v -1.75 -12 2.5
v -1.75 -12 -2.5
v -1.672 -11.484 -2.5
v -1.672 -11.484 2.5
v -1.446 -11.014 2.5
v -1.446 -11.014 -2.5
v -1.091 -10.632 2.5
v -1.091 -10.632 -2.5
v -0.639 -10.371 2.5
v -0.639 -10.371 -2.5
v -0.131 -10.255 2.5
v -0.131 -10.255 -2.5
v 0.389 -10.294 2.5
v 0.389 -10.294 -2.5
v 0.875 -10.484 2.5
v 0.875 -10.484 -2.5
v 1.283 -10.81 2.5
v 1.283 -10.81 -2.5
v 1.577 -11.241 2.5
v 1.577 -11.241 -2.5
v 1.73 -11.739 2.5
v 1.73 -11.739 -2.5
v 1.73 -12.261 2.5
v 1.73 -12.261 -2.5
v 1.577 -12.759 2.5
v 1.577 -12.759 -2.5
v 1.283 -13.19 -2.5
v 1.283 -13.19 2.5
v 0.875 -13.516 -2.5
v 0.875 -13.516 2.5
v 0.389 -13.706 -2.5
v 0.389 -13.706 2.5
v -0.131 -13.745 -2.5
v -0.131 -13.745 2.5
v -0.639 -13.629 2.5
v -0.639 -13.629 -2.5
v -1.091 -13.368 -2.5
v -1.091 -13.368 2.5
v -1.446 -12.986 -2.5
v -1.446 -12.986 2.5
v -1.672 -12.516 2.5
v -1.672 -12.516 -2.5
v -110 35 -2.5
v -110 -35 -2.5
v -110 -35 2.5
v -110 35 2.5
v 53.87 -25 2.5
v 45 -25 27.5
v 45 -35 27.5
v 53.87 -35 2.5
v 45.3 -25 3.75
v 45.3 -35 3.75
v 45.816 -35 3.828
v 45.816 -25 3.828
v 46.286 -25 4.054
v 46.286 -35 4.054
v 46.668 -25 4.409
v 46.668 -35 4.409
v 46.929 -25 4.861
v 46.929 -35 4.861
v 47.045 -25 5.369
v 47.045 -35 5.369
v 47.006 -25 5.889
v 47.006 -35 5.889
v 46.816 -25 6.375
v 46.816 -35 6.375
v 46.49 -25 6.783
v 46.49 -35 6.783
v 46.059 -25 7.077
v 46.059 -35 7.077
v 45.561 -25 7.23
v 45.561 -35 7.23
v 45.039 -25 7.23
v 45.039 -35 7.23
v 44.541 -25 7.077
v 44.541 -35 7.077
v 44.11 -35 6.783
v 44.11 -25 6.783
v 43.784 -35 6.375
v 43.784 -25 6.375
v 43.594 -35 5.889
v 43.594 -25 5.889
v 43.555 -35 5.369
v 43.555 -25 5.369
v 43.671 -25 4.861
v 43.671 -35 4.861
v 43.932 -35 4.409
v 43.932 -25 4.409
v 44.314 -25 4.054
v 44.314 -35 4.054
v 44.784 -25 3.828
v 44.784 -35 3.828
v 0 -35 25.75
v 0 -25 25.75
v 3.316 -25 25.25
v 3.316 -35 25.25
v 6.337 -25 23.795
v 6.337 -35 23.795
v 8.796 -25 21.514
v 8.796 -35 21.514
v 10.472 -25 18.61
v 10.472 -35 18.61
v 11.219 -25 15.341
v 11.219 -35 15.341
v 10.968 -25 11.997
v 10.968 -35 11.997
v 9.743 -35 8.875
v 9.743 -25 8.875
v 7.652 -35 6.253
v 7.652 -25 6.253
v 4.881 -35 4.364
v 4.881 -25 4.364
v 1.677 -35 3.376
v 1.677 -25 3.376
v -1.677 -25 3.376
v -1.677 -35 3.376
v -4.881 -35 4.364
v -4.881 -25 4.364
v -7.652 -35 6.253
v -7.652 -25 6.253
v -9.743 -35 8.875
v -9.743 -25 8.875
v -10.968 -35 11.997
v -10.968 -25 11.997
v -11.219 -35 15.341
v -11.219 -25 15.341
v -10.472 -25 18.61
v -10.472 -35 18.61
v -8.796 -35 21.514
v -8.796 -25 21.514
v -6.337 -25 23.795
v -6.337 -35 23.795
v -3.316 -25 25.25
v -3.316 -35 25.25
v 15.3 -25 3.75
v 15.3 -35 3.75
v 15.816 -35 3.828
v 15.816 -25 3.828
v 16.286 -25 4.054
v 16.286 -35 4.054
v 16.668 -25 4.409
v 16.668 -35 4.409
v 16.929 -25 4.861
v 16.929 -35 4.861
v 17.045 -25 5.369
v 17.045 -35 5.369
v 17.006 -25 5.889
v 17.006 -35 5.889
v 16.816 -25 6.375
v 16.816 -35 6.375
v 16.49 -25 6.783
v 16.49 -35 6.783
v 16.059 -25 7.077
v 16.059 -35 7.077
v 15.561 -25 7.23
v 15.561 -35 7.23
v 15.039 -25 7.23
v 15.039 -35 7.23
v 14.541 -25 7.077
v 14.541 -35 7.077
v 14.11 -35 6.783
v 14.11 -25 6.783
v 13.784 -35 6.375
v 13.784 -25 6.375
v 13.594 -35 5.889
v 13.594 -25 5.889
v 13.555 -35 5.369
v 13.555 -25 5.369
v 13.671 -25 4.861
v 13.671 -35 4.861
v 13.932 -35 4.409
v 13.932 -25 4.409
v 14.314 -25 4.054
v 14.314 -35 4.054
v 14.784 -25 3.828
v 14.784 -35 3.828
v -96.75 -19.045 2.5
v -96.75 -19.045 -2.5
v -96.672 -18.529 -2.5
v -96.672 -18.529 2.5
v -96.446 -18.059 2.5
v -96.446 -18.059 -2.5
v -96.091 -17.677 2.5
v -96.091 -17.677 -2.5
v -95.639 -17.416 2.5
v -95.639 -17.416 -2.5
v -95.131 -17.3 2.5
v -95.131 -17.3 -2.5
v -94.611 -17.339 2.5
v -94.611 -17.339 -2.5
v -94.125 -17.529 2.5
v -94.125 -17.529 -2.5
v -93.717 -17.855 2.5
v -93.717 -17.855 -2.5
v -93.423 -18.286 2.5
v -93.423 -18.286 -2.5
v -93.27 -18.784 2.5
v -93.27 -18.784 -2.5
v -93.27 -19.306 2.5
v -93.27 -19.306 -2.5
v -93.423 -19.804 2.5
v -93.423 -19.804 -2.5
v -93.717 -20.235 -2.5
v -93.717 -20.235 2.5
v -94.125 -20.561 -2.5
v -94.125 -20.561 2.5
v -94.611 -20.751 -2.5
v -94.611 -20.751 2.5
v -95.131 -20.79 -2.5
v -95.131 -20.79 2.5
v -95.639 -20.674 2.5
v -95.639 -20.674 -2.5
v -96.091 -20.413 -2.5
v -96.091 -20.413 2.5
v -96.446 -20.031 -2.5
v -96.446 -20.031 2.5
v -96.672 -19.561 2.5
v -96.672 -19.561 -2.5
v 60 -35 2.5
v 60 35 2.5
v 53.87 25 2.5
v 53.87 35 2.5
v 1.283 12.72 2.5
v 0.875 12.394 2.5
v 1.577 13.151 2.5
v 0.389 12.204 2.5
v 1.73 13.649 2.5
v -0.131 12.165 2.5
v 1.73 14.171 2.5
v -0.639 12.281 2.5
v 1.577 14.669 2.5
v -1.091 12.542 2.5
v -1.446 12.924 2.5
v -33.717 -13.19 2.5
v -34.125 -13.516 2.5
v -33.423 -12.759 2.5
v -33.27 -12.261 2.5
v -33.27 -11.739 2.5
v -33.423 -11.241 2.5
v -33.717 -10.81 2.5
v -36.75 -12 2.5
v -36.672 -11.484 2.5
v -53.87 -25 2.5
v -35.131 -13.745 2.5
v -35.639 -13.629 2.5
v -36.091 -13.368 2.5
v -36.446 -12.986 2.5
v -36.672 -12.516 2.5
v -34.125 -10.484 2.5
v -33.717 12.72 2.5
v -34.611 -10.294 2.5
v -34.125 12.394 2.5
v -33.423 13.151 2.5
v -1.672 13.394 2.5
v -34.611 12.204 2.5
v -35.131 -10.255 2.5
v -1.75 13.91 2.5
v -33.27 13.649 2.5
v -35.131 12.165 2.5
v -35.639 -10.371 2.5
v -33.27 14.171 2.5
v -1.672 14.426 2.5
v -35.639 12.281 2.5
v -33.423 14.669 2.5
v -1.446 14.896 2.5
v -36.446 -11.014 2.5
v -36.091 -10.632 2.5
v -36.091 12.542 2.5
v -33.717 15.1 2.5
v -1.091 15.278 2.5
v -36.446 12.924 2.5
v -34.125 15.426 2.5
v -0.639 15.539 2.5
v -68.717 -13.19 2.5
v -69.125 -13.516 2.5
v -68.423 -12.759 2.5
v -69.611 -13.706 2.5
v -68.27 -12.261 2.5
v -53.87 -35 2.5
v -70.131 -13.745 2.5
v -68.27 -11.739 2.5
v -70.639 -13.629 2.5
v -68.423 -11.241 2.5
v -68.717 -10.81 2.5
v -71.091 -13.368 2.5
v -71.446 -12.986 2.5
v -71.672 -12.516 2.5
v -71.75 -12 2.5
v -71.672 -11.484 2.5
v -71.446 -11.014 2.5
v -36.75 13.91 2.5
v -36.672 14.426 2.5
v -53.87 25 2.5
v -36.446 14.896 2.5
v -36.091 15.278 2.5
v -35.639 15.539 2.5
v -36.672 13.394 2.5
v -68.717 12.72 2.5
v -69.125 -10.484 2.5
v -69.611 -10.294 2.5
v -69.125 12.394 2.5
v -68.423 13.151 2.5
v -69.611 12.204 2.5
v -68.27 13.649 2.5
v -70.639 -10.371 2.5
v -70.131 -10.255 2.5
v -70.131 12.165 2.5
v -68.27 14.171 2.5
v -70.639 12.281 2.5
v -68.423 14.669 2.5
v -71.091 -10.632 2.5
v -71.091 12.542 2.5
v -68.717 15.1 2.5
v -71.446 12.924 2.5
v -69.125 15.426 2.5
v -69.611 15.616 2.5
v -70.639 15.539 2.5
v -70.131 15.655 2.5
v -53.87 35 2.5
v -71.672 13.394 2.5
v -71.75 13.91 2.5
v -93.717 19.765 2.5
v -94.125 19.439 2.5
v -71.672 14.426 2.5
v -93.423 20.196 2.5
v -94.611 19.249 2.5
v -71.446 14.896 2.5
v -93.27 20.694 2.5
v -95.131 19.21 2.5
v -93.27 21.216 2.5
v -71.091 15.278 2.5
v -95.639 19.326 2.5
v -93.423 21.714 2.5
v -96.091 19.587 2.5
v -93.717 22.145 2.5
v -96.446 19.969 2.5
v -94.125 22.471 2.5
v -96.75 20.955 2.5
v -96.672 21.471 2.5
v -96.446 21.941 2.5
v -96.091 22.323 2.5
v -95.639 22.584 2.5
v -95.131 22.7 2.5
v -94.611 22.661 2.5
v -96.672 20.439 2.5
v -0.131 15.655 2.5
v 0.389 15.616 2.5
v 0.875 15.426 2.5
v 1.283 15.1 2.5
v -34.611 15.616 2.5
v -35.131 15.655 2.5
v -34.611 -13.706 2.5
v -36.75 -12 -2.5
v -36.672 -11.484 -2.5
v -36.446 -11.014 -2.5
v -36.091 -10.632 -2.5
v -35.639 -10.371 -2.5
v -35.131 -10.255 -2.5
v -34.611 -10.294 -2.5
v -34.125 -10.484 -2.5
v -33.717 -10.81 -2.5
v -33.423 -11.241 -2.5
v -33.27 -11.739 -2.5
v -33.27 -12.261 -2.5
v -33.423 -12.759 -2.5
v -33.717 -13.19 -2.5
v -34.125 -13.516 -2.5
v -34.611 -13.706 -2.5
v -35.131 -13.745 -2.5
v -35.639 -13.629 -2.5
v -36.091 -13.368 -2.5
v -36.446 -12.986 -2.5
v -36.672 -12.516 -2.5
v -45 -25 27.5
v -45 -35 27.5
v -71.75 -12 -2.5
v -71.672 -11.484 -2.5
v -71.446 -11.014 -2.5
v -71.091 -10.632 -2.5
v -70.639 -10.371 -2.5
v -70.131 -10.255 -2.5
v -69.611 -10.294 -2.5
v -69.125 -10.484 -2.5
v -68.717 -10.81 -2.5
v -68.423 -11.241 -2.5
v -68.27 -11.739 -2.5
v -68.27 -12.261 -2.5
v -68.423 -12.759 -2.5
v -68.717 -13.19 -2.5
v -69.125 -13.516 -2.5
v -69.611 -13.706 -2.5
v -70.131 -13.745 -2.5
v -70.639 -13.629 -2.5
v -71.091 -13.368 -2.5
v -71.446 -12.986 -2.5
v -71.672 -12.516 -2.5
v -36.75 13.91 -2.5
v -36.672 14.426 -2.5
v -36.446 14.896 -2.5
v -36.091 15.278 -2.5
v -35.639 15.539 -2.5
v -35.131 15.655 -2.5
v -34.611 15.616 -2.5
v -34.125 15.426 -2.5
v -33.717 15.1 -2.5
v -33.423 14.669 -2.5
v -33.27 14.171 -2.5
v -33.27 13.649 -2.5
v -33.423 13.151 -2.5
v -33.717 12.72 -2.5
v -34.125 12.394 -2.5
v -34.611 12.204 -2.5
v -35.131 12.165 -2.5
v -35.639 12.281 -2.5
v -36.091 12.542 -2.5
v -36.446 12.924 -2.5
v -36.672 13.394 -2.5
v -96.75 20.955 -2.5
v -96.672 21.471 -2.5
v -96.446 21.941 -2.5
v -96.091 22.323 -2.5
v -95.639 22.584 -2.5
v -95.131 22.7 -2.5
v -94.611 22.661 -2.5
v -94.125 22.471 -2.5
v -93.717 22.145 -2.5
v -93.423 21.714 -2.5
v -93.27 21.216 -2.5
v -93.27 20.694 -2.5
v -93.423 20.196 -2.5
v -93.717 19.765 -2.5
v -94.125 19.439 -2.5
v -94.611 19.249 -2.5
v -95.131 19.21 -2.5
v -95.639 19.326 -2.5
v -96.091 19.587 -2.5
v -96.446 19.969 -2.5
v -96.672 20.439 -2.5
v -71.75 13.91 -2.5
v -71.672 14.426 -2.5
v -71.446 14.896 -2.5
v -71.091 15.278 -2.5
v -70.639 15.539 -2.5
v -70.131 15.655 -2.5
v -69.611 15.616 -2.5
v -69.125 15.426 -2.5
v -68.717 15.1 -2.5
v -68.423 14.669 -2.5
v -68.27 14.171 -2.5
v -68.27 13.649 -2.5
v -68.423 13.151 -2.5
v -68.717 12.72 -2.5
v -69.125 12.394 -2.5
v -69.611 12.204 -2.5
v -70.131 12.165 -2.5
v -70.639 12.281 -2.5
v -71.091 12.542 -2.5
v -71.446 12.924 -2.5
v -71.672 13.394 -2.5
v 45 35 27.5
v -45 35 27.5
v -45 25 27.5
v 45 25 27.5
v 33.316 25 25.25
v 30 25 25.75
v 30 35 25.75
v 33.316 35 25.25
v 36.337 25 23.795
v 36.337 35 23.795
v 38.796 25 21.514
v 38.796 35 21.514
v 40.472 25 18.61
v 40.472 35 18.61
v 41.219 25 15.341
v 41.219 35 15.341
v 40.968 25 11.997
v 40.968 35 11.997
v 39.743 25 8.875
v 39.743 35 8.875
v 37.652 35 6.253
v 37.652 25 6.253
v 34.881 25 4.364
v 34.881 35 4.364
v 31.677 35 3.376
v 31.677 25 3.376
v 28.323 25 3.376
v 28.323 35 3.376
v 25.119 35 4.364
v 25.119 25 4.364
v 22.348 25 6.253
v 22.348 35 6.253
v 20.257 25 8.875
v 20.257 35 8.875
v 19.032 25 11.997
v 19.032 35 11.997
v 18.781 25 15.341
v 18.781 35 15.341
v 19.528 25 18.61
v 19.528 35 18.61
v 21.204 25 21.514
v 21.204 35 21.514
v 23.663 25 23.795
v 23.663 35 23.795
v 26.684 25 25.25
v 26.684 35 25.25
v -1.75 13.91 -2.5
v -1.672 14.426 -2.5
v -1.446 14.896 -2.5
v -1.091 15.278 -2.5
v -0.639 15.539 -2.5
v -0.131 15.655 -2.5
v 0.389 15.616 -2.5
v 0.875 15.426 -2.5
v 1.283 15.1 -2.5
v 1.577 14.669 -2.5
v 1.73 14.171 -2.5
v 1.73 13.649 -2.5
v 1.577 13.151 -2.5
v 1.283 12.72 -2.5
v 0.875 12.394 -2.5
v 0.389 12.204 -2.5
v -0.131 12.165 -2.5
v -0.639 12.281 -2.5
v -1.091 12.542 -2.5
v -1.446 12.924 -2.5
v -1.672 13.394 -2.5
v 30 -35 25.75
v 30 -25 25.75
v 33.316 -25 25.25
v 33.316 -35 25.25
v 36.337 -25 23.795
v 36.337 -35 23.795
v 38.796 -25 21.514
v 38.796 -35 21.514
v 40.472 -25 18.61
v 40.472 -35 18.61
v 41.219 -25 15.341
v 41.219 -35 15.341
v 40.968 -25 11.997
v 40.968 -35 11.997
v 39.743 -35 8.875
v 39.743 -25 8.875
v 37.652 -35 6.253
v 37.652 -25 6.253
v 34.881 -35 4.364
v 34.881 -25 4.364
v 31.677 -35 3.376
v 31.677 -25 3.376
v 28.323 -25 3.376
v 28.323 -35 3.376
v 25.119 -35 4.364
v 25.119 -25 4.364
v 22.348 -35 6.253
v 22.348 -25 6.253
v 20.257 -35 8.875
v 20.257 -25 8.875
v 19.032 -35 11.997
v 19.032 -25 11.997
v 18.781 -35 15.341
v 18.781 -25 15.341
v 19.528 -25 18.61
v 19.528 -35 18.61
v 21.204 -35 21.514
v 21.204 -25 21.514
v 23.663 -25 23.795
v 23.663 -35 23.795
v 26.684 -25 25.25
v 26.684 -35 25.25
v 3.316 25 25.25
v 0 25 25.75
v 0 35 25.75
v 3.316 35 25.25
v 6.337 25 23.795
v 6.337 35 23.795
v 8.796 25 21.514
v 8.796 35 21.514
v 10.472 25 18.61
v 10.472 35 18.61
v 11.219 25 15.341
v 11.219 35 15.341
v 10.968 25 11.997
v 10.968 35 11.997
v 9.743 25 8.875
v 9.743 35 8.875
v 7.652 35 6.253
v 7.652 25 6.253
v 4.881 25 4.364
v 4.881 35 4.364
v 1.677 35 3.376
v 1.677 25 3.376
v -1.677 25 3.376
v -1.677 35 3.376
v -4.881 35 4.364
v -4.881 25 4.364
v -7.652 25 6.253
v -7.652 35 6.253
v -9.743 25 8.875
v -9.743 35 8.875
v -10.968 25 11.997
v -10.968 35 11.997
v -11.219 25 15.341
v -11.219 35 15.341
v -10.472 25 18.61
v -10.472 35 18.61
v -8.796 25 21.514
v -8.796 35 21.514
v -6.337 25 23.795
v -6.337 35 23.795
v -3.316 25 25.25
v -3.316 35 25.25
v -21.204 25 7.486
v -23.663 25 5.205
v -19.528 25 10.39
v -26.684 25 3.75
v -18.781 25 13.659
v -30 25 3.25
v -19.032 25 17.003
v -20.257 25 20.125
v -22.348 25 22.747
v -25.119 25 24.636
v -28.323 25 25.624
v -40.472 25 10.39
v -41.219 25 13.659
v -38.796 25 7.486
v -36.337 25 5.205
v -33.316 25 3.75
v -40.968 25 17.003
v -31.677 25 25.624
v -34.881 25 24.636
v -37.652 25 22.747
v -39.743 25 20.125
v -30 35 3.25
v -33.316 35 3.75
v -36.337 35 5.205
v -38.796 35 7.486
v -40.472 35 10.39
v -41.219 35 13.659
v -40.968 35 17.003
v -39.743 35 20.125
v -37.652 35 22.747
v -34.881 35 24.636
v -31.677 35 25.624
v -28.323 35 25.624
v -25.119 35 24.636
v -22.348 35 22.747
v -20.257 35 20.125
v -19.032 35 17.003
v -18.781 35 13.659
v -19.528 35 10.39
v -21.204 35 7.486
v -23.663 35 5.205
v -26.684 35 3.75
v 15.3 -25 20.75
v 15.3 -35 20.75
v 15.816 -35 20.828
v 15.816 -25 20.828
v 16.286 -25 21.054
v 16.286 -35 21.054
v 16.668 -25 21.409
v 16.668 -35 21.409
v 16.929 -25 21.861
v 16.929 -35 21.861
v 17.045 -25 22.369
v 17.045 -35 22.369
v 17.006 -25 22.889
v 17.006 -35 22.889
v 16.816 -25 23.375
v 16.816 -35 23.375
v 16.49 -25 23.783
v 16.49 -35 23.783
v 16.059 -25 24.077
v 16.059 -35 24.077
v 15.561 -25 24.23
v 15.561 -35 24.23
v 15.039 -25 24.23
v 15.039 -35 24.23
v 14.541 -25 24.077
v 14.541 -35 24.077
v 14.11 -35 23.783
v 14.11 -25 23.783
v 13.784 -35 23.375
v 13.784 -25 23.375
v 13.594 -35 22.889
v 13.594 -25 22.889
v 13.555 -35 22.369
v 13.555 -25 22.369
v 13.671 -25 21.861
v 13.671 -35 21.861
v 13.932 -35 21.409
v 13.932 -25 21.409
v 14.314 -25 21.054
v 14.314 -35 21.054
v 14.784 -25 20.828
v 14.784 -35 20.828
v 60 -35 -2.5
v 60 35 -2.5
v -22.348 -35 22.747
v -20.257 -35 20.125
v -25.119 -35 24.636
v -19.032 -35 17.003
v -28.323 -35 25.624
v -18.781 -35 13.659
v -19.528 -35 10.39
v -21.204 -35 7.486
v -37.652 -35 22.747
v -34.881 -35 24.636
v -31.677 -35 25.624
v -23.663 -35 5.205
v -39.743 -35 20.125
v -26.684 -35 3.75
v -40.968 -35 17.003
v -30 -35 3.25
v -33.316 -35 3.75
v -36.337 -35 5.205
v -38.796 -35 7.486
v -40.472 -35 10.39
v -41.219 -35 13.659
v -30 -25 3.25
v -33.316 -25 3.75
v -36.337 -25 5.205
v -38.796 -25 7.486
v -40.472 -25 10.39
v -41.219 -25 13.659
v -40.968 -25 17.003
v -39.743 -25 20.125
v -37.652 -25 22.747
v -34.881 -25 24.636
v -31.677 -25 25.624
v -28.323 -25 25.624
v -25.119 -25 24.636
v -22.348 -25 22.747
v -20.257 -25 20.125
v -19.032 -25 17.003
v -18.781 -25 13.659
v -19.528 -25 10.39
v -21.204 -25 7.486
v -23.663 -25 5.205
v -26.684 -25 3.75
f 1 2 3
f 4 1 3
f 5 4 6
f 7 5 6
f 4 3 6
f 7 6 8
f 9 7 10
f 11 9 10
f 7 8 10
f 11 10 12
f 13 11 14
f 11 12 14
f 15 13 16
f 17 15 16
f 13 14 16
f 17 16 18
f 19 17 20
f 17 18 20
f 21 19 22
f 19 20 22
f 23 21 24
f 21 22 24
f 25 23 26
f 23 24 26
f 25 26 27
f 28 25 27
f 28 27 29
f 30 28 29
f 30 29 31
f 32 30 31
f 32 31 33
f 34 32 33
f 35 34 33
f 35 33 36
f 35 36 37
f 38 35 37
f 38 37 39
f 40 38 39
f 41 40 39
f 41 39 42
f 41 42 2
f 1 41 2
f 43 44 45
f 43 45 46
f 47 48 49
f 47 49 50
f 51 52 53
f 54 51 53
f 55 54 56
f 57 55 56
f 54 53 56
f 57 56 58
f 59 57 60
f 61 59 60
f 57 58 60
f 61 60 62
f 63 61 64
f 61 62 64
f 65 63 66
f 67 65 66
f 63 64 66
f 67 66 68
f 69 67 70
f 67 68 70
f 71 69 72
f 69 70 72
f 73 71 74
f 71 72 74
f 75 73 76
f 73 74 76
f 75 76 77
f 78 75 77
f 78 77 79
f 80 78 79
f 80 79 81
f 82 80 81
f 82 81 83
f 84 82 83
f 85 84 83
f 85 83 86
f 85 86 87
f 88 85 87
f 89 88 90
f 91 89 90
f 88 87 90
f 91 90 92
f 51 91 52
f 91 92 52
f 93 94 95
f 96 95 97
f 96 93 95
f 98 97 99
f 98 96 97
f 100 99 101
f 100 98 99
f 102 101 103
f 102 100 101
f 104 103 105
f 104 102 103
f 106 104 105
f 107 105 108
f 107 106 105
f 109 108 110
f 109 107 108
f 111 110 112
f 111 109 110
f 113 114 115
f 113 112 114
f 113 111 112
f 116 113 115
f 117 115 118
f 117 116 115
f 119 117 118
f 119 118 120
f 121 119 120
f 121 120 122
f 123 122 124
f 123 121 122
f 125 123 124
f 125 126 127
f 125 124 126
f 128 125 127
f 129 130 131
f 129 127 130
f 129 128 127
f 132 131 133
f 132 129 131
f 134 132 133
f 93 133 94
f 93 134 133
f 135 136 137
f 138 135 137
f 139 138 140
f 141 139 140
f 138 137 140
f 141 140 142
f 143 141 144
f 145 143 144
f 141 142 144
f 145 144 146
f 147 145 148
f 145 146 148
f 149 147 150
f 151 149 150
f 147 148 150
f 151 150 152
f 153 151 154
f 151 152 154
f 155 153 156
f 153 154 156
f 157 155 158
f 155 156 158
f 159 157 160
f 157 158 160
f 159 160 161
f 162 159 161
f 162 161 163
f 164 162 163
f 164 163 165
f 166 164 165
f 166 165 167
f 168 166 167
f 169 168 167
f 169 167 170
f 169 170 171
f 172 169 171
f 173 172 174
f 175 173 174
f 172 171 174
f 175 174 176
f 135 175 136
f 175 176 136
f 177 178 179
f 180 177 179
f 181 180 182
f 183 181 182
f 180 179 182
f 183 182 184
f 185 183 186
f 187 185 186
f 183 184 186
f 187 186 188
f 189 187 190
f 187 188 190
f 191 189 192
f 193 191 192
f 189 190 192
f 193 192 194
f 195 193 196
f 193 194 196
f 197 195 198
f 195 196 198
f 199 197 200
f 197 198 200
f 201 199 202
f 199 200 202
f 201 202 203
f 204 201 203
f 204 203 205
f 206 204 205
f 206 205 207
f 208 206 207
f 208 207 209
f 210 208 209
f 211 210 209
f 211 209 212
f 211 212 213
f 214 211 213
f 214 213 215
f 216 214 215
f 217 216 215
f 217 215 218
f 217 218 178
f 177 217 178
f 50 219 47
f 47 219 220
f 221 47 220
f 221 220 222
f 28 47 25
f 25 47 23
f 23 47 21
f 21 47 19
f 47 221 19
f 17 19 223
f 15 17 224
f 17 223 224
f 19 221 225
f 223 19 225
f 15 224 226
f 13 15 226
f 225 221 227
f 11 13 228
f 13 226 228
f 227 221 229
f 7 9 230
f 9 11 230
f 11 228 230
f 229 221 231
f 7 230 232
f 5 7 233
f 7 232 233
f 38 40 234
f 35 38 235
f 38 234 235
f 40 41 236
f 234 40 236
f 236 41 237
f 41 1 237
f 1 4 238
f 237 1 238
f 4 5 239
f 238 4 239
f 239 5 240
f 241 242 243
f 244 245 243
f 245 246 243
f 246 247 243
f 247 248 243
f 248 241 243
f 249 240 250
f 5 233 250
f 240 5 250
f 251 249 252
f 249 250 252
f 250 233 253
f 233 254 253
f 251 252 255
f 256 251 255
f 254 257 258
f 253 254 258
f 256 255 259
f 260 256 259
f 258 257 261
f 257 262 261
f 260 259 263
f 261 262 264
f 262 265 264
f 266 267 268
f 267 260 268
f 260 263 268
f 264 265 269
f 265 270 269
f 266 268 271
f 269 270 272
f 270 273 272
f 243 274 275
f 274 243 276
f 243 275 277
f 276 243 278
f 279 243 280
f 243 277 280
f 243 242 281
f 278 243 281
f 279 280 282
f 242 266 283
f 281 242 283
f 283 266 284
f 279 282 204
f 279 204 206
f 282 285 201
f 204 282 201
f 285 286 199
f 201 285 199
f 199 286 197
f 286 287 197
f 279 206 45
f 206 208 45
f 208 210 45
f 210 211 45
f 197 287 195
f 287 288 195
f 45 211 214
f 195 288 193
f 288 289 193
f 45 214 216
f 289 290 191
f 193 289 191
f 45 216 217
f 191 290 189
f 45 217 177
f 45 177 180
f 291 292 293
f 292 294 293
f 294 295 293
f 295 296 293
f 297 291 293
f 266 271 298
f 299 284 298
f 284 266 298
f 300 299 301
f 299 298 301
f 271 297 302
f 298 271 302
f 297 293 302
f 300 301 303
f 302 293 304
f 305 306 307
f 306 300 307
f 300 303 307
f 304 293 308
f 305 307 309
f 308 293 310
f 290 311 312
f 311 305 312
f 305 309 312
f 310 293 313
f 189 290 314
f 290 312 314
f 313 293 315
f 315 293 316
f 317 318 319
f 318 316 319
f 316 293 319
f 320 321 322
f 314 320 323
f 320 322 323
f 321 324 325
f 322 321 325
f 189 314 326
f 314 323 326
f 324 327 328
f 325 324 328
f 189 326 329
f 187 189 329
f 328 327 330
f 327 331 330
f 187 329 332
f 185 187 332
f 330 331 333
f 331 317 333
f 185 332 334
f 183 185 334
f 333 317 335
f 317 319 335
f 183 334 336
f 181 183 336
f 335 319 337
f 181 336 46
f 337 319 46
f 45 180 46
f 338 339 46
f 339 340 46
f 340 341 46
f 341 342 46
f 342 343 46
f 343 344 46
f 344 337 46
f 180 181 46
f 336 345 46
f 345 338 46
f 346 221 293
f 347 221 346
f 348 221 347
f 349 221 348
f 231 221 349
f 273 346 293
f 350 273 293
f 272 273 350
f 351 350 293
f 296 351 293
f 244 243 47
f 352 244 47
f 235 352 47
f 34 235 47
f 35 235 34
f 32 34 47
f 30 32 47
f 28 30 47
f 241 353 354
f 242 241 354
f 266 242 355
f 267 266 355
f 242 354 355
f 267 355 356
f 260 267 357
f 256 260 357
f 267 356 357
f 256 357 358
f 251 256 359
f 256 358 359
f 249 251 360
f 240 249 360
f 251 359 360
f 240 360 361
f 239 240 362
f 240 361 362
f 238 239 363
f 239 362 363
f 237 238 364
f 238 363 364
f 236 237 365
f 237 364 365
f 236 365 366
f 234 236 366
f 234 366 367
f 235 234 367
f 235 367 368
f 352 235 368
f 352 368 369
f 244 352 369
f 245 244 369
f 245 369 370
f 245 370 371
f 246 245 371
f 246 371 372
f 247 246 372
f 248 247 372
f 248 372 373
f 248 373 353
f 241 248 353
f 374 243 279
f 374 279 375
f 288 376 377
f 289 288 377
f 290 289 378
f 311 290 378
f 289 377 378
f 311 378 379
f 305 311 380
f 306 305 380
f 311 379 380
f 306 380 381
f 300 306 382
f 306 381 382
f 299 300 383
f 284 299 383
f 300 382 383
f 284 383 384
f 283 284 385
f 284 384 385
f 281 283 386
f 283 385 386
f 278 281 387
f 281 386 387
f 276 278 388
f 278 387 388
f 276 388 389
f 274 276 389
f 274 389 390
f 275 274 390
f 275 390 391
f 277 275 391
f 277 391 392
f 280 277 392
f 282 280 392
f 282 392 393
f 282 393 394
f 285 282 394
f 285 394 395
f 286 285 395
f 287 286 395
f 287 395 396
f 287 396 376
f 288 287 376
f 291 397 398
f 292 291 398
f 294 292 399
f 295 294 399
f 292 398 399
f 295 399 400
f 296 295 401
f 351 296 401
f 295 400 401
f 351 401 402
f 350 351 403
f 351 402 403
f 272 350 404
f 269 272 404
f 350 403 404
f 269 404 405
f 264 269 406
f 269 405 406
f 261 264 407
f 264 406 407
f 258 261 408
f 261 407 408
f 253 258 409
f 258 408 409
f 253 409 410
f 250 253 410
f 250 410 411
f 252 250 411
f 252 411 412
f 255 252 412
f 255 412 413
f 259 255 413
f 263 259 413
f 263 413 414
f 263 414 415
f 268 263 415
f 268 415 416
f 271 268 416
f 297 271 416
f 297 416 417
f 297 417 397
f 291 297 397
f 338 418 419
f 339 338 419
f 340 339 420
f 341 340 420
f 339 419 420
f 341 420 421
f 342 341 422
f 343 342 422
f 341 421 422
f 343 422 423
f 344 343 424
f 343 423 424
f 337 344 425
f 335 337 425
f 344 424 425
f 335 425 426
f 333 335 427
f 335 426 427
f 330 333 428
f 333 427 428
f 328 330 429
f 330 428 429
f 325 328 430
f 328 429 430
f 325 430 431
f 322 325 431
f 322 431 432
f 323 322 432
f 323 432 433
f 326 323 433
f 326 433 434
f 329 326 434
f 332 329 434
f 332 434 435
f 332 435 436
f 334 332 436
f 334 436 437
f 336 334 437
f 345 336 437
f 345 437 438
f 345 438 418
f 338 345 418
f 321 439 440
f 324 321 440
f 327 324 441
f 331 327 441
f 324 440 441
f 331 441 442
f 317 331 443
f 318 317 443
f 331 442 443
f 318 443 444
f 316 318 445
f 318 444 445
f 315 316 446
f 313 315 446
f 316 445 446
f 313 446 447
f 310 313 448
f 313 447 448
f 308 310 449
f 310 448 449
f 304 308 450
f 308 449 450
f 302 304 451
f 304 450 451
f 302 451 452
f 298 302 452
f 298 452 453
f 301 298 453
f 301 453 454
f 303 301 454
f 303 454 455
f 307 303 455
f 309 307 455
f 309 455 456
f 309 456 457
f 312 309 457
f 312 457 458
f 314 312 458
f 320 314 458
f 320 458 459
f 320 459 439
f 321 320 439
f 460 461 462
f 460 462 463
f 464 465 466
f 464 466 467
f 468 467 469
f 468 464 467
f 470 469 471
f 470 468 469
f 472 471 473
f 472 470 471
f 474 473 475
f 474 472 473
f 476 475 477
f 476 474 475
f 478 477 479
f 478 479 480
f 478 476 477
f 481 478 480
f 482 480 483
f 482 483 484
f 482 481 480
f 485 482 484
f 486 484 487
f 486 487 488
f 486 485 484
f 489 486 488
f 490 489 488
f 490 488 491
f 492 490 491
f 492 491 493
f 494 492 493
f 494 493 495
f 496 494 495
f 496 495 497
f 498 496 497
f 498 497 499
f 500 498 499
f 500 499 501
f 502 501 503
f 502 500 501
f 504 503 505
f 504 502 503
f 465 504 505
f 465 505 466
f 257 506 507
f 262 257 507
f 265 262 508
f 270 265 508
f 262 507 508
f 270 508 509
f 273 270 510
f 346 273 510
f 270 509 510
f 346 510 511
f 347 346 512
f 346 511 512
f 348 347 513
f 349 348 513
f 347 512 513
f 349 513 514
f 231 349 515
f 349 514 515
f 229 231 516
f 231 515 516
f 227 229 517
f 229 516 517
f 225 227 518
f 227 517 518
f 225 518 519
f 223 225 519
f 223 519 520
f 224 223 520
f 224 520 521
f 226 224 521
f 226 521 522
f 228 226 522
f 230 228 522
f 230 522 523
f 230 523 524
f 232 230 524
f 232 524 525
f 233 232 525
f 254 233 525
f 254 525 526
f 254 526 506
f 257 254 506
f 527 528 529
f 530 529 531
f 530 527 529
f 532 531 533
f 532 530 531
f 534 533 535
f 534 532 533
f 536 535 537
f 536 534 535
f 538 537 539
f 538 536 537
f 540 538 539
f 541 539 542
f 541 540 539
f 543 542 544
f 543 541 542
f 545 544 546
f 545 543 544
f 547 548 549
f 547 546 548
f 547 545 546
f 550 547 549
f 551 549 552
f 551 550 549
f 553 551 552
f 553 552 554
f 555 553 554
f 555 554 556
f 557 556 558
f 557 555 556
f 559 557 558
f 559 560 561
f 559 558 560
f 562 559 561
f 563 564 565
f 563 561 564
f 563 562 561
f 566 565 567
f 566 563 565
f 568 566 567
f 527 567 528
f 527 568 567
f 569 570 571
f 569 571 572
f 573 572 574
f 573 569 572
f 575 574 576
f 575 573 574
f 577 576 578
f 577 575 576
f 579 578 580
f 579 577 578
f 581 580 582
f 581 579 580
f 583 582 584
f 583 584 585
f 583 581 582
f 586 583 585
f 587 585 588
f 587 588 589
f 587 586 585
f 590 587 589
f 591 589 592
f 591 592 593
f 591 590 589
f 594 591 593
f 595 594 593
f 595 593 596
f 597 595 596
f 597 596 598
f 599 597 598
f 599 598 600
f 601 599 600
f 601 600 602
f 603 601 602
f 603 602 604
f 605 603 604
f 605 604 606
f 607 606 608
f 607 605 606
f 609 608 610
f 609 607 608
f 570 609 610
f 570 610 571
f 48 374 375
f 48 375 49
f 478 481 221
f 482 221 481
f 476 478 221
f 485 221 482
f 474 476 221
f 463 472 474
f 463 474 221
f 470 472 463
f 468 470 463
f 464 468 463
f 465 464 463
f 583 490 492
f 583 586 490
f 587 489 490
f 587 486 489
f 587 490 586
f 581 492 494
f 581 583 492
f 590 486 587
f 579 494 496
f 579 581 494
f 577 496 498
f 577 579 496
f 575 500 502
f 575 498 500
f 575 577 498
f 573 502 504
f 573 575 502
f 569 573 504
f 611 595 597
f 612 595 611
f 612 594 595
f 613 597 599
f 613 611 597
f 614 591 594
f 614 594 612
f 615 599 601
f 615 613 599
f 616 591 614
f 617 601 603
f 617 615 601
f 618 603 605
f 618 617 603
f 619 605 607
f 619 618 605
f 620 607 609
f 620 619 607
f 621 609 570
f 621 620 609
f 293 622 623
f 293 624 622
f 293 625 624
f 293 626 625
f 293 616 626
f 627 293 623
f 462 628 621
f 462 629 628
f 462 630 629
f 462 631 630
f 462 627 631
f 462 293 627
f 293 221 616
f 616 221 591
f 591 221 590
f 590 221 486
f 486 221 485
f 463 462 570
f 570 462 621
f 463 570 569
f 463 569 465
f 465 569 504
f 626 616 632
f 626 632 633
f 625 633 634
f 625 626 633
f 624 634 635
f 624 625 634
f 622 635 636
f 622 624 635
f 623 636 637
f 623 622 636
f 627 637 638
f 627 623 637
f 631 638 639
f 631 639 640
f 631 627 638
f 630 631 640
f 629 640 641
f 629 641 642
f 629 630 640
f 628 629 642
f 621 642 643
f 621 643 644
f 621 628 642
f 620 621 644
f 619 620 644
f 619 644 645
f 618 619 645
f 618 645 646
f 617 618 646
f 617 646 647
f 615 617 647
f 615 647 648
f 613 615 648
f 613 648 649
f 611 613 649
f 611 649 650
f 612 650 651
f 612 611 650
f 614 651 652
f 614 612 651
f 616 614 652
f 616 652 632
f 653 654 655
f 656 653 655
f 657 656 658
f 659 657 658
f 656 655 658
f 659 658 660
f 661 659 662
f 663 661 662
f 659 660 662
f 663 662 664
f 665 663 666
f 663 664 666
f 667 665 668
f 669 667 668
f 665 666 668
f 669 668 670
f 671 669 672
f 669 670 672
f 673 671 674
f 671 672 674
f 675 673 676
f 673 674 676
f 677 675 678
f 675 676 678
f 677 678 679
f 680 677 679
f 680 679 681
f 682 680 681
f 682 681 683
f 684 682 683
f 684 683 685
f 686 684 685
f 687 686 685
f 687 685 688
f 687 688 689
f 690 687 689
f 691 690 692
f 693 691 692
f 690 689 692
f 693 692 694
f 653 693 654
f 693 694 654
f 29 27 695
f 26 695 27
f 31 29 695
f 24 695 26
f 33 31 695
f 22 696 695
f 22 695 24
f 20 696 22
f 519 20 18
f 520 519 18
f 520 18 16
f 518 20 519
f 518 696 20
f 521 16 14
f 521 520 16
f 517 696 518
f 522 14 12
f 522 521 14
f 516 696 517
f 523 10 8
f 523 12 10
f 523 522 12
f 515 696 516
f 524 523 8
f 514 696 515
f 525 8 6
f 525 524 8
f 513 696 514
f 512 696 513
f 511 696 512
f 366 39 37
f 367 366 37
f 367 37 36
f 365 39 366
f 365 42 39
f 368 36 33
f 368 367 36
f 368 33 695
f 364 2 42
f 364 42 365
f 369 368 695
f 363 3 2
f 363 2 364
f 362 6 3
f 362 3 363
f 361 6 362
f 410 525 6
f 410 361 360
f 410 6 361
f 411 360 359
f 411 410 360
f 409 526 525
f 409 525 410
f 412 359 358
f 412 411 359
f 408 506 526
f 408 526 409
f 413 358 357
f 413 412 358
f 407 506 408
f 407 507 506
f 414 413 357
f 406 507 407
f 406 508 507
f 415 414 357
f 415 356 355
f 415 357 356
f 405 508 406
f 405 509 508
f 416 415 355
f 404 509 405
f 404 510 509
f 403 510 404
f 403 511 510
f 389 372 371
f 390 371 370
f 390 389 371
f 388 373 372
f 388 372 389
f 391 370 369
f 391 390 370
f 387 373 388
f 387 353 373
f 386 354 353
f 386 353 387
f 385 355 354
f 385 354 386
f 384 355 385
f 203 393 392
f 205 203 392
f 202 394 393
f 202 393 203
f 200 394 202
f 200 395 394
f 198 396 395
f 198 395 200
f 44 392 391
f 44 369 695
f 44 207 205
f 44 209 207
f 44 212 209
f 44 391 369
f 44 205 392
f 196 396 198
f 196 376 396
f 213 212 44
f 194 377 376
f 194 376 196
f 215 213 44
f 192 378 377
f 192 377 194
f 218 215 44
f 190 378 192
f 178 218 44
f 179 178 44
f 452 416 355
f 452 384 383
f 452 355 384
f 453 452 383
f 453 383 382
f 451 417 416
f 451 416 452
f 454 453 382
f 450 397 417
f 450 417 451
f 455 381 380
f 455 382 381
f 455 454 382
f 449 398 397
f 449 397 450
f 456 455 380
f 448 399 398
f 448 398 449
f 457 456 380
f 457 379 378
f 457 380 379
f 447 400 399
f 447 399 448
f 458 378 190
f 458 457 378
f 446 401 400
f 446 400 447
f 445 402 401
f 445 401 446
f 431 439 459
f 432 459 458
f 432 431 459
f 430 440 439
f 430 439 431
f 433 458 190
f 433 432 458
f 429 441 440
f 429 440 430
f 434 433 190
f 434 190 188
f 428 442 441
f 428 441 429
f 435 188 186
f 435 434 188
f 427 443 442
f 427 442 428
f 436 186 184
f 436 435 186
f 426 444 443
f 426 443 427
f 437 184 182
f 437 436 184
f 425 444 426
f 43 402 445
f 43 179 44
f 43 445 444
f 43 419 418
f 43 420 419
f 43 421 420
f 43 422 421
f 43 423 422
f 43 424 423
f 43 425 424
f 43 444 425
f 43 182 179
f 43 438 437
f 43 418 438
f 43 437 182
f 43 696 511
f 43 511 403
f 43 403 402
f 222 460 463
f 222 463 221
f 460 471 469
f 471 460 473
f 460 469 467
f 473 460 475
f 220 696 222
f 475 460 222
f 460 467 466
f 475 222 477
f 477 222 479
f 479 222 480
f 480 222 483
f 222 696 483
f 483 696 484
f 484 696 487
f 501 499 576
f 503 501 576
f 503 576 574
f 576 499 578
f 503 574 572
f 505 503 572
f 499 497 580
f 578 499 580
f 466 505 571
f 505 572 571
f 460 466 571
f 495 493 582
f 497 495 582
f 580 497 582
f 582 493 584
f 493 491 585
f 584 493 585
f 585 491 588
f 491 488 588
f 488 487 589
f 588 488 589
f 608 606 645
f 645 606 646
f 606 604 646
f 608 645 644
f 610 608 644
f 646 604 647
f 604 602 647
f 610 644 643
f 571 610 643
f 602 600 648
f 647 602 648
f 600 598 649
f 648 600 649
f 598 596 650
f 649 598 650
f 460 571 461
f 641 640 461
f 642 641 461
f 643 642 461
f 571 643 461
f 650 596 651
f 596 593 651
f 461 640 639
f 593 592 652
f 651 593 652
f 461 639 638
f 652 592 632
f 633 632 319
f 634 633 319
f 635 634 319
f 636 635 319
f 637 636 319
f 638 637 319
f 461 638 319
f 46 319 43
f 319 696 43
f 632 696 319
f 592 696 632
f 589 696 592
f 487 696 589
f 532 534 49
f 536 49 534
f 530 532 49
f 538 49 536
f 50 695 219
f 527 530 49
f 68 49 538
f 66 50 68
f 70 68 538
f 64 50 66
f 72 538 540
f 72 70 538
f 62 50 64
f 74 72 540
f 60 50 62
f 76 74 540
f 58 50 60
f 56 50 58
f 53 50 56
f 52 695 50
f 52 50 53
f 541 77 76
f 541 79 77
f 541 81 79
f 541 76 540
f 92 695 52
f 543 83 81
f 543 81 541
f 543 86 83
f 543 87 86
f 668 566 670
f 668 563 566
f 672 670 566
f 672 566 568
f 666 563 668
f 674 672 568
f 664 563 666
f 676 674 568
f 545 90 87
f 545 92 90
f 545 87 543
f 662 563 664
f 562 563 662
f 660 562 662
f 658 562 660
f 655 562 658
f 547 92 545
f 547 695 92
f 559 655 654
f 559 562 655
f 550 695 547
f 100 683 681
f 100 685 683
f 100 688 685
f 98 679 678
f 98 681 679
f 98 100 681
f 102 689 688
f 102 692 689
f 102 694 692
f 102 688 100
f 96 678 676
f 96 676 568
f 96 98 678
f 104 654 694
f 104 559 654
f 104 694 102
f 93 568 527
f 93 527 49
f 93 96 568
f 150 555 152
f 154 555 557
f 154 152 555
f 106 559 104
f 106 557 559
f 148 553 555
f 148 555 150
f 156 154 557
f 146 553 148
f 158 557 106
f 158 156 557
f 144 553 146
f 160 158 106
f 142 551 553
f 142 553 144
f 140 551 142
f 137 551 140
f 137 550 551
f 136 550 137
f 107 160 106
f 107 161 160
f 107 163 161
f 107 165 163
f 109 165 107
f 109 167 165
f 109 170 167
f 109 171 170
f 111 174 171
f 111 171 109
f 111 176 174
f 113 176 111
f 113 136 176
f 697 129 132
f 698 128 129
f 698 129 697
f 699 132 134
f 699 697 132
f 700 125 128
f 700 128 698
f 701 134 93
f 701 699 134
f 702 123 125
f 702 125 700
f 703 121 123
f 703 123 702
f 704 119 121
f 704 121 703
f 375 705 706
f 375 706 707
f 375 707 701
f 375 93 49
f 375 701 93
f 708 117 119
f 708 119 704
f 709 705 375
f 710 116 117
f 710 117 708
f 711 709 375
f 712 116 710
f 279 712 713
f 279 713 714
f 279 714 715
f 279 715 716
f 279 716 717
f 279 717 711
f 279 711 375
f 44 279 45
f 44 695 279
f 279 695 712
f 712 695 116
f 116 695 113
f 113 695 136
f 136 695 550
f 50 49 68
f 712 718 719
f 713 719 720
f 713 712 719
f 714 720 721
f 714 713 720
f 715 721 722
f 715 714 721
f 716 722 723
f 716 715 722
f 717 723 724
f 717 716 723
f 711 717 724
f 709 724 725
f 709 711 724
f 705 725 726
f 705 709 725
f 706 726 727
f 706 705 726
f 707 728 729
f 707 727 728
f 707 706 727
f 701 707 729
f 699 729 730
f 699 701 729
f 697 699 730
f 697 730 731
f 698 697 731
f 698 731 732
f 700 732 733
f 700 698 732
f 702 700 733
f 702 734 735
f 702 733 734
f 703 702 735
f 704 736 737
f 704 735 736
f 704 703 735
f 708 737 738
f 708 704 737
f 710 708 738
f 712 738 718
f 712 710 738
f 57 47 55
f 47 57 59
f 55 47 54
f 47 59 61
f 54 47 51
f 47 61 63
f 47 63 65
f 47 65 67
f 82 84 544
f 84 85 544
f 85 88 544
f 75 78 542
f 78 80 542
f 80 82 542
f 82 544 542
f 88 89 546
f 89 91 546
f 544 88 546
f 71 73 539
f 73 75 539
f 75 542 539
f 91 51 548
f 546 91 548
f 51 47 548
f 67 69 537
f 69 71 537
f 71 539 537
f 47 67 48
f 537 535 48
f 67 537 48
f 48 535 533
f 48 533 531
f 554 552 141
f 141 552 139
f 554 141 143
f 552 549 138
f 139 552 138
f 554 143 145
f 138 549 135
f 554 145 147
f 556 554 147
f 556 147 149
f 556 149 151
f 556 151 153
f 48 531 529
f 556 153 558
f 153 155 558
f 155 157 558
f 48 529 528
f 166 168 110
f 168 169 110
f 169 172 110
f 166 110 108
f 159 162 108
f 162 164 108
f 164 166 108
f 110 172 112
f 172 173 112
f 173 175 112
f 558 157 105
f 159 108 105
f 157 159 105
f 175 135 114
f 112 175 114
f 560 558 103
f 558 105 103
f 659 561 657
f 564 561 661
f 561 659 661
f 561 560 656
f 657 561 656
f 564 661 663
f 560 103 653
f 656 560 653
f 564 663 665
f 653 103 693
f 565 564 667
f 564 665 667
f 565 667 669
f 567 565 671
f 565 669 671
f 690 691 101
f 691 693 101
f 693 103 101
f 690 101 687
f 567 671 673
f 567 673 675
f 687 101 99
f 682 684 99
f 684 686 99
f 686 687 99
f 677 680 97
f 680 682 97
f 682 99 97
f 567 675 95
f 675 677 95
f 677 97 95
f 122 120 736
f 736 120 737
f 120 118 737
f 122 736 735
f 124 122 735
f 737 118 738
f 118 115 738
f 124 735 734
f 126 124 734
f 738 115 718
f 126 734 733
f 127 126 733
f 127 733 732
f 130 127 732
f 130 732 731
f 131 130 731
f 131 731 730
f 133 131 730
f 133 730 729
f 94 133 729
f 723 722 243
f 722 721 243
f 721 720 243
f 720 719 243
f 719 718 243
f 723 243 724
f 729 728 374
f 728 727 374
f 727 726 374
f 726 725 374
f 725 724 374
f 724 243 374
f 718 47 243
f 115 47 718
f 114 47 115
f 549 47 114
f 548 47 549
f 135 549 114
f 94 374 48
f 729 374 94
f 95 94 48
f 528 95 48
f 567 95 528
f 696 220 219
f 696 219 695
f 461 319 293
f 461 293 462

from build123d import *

# Parameters (mm, degrees)
SKETCH_1_R          = 11.25
EXTRUDE_1_DEPTH     = 35
SKETCH_2_W          = 25
SKETCH_2_H          = 50
CUT_EXTRUDE1_DEPTH  = 147.905581923
SKETCH1_W           = 30
SKETCH1_H           = 70
BOSS_EXTRUDE1_DEPTH = 5
SKETCH3_R           = 1.75
CUT_EXTRUDE4_DEPTH  = 10
SKETCH_3_R          = 1.75
CUT_EXTRUDE_2_DEPTH = 10


with BuildPart() as part:
    # Эскиз1 → Бобышка-Вытянуть1 (new, symmetric)
    with BuildSketch(Plane(origin=(0, 0, 0), x_dir=(1, 0, 0), z_dir=(0, 1, 0))):
        Polygon((-60, -2.5), (-53.870442851, -2.5), (-45, -27.5), (45, -27.5), (53.870442851, -2.5), (60, -2.5), (60, 2.5), (-60, 2.5), (-80, 2.5), (-80, -2.5), align=None)
        with Locations(Location((0, -14.5, 0), (0, 0, 270))):
            Circle(SKETCH_1_R, mode=Mode.SUBTRACT)
        with Locations(Location((30, -14.5, 0), (0, 0, 270))):
            Circle(SKETCH_1_R, mode=Mode.SUBTRACT)
        with Locations(Location((-30, -14.5, 0), (0, 0, 90))):
            Circle(SKETCH_1_R, mode=Mode.SUBTRACT)
    extrude(amount=EXTRUDE_1_DEPTH, both=True)

    # Эскиз2 → Cut-Extrude1 (cut, through all)
    with BuildSketch(Plane.ZY.offset(80)):
        with Locations((15, 0)):
            Rectangle(SKETCH_2_W, SKETCH_2_H)
    extrude(amount=-CUT_EXTRUDE1_DEPTH, mode=Mode.SUBTRACT)

    # Sketch1 → Boss-Extrude1 (add)
    with BuildSketch(Plane(origin=(0, 0, -2.5), x_dir=(-1, 0, 0), z_dir=(0, 0, -1))):
        with Locations((95, 0)):
            Rectangle(SKETCH1_W, SKETCH1_H)
    extrude(amount=-BOSS_EXTRUDE1_DEPTH)

    # Sketch3 → Cut-Extrude4 (cut)
    with BuildSketch(Plane.XZ.offset(35)):
        with Locations(Location((45.3, 5.5, 0), (0, 0, 270))):
            Circle(SKETCH3_R)
        with Locations(Location((15.3, 22.5, 0), (0, 0, 270))):
            Circle(SKETCH3_R)
        with Locations(Location((15.3, 5.5, 0), (0, 0, 270))):
            Circle(SKETCH3_R)
    extrude(amount=-CUT_EXTRUDE4_DEPTH, mode=Mode.SUBTRACT)

    # Эскиз3 → Вырез-Вытянуть2 (cut)
    with BuildSketch(Plane(origin=(0, 0, -2.5), x_dir=(-1, 0, 0), z_dir=(0, 0, -1))):
        with Locations((0, -12)):
            Circle(SKETCH_3_R)
        with Locations((35, -12)):
            Circle(SKETCH_3_R)
        with Locations((70, -12)):
            Circle(SKETCH_3_R)
        with Locations((35, 13.91)):
            Circle(SKETCH_3_R)
        with Locations((70, 13.91)):
            Circle(SKETCH_3_R)
        with Locations((0, 13.91)):
            Circle(SKETCH_3_R)
        with Locations((95, 20.955)):
            Circle(SKETCH_3_R)
        with Locations((95, -19.045)):
            Circle(SKETCH_3_R)
    extrude(amount=-CUT_EXTRUDE_2_DEPTH, mode=Mode.SUBTRACT)


solid = part.part
